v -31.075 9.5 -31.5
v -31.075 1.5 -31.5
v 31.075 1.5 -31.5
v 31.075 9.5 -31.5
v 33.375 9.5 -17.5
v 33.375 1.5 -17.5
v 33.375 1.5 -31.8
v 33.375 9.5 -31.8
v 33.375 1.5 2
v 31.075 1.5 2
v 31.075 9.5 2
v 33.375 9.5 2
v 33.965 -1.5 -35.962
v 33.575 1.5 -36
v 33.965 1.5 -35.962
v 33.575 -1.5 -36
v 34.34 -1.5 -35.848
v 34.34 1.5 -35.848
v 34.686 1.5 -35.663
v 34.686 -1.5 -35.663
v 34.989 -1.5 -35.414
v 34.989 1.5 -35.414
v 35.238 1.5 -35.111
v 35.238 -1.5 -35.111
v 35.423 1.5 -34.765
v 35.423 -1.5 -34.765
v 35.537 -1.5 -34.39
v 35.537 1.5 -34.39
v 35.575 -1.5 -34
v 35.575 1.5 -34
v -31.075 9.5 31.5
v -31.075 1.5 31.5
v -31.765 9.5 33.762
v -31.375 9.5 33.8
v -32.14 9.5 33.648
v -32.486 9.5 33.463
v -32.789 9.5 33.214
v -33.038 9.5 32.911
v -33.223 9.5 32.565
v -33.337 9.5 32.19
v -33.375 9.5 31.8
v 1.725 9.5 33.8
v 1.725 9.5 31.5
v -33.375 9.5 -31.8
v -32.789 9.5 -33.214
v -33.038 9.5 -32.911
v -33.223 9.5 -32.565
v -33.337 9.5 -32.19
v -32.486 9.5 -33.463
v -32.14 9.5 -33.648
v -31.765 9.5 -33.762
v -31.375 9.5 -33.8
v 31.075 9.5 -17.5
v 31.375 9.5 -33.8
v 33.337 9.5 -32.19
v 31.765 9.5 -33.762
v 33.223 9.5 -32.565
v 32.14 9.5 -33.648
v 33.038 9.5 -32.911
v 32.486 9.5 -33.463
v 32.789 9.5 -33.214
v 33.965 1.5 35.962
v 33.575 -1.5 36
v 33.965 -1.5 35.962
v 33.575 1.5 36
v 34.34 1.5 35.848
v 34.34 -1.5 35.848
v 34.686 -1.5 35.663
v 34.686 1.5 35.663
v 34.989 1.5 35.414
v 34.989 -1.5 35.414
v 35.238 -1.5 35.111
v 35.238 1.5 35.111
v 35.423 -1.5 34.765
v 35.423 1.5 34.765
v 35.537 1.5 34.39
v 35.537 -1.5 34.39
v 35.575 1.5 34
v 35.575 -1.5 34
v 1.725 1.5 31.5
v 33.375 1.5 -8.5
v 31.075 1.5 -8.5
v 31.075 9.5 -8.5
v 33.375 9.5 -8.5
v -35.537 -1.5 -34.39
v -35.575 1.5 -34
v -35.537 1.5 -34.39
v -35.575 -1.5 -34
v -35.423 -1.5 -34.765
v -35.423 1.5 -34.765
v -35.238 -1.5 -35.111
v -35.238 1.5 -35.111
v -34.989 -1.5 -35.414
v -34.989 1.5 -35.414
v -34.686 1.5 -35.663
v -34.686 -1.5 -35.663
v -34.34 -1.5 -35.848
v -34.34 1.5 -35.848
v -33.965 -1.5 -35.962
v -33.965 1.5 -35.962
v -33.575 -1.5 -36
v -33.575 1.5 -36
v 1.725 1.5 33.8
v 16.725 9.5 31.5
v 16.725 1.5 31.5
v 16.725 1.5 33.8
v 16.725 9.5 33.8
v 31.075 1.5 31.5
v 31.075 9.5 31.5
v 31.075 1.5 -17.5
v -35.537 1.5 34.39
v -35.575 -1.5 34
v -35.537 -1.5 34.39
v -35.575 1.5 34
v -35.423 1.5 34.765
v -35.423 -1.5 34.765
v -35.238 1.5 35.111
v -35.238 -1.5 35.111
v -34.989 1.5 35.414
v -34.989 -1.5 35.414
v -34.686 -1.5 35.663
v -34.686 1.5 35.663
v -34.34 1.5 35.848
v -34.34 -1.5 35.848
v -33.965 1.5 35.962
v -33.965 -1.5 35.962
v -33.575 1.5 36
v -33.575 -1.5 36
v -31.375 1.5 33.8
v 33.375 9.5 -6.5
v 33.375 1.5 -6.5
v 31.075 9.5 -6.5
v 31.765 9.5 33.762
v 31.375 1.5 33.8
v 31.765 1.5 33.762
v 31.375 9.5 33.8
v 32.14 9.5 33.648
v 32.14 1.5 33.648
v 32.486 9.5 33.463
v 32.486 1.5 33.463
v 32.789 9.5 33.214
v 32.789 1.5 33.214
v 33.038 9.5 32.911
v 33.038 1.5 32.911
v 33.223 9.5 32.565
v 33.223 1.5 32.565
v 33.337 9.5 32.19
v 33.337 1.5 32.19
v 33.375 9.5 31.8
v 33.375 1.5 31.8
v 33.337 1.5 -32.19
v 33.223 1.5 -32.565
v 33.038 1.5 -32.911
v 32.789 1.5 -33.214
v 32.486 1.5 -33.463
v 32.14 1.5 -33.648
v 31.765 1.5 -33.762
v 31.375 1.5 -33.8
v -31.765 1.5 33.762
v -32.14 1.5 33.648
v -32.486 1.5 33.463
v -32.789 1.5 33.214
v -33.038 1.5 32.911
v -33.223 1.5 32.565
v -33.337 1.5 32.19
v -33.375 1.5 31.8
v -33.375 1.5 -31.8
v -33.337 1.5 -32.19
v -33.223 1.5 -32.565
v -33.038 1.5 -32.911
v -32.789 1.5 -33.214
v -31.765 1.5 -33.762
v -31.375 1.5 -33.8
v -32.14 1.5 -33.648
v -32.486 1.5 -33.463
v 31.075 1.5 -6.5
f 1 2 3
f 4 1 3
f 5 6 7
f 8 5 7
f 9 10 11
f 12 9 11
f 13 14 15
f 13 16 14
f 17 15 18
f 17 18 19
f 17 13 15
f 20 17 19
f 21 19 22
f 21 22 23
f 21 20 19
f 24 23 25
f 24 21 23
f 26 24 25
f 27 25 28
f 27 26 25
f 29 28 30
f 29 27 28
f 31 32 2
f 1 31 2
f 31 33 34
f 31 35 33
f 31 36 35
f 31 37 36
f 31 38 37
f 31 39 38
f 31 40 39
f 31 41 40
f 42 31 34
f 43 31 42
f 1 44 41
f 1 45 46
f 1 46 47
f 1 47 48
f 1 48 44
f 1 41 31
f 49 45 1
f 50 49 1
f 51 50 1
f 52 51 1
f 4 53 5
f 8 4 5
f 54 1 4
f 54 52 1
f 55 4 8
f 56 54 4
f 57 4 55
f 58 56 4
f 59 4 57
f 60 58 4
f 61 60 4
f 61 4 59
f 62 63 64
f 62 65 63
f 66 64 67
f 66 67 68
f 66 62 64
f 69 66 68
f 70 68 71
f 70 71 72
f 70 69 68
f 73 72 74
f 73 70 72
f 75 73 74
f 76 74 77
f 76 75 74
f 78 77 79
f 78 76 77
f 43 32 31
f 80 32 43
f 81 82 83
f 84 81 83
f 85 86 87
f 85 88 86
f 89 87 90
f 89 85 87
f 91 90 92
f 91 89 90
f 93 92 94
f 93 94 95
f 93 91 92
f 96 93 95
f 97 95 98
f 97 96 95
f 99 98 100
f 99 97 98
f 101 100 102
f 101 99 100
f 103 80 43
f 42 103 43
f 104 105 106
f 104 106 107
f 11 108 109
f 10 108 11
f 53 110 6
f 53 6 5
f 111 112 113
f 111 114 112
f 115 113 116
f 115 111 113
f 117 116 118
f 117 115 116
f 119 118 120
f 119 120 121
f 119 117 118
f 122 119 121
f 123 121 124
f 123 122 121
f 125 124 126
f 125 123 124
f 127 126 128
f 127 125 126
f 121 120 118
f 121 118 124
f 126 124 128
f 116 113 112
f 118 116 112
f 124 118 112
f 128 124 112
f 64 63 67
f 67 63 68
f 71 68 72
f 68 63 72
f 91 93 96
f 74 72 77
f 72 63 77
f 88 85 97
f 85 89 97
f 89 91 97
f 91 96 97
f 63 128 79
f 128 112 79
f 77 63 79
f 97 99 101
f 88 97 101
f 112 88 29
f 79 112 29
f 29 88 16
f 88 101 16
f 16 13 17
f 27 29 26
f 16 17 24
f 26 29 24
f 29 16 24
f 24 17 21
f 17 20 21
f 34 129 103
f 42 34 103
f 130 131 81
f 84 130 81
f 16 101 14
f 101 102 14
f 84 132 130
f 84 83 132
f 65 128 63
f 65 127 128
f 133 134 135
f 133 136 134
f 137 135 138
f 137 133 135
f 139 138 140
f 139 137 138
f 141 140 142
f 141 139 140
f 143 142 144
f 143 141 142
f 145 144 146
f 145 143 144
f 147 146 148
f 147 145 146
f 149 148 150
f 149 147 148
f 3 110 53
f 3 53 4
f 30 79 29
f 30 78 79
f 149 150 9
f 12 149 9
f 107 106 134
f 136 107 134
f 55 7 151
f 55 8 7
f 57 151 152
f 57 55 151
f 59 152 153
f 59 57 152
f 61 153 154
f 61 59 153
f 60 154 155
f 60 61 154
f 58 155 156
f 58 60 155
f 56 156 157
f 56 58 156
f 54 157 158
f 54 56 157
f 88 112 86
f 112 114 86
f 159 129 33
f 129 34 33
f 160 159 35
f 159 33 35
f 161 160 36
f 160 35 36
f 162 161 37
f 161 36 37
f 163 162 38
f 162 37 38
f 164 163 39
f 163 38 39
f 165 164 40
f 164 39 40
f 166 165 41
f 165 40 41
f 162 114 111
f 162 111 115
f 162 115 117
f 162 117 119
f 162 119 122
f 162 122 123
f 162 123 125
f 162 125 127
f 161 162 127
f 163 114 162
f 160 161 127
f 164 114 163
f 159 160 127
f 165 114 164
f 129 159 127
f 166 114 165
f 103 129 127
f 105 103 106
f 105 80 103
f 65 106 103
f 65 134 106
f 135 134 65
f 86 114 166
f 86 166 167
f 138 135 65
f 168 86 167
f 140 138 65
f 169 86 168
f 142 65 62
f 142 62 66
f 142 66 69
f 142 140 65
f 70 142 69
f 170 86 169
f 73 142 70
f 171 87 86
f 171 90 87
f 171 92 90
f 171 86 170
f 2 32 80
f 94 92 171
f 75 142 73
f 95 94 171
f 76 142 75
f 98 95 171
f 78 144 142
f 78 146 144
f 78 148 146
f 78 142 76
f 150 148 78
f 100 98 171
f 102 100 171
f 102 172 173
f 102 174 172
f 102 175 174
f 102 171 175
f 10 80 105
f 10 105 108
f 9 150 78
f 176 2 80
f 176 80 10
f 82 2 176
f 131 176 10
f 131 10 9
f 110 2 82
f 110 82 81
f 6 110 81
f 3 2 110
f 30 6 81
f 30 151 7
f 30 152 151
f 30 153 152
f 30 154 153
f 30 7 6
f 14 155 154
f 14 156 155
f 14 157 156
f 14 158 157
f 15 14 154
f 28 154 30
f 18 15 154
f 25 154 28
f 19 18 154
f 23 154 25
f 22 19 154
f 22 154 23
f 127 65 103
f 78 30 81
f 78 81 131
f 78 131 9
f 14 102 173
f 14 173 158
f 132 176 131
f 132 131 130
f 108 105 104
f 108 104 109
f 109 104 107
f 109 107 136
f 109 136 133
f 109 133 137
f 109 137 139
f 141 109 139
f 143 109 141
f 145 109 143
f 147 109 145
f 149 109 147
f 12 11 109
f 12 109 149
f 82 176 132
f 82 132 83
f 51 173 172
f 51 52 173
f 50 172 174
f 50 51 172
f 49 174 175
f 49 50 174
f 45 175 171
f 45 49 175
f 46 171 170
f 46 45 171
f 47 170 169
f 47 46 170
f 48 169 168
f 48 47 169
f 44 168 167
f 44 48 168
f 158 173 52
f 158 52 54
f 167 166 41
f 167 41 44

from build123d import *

# Parameters (mm, degrees)
ESBO_O1_W                = 71.15
ESBO_O1_H                = 72
RESSALTO_EXTRUS_O1_DEPTH = 1.5
ESBO_O2_W                = 66.75
ESBO_O2_H                = 67.6
ESBO_O2_W_2              = 62.15
ESBO_O2_H_2              = 63
RESSALTO_EXTRUS_O2_DEPTH = 8
FILETE1_R                = 2
ESBO_O3_W                = 9
ESBO_O3_H                = 8
CORTE_EXTRUS_O1_DEPTH    = 4.5
ESBO_O4_W                = 8.5
ESBO_O4_H                = 8
CORTE_EXTRUS_O2_DEPTH    = 4.5
ESBO_O5_W                = 15
ESBO_O5_H                = 8
CORTE_EXTRUS_O3_DEPTH    = 4.5


with BuildPart() as part:
    # Esboço1 → Ressalto-extrusão1 (new body, symmetric)
    with BuildSketch(Plane(origin=(0, 0, 0), x_dir=(1, 0, 0), z_dir=(0, 1, 0))):
        Rectangle(ESBO_O1_W, ESBO_O1_H)
    extrude(amount=RESSALTO_EXTRUS_O1_DEPTH, both=True)

    # Esboço2 → Ressalto-extrusão2 (add)
    with BuildSketch(Plane(origin=(0, 1.5, 0), x_dir=(1, 0, 0), z_dir=(0, 1, 0))):
        Rectangle(ESBO_O2_W, ESBO_O2_H)
        Rectangle(ESBO_O2_W_2, ESBO_O2_H_2, mode=Mode.SUBTRACT)
    extrude(amount=RESSALTO_EXTRUS_O2_DEPTH)

    # Filete1
    filete1_edges = [part.edges().sort_by_distance(p)[0] for p in [
        (-33.375, 5.5, 33.8),
        (33.375, 5.5, 33.8),
        (33.375, 5.5, -33.8),
        (-33.375, 5.5, -33.8),
        (35.575, 0, 36),
        (-35.575, 0, 36),
        (-35.575, 0, -36),
        (35.575, 0, -36),
    ]]
    fillet(filete1_edges, radius=FILETE1_R)

    # Esboço3 → Corte-extrusão1 (cut)
    with BuildSketch(Plane.ZY.offset(-31.075)):
        with Locations((-13, 5.5)):
            Rectangle(ESBO_O3_W, ESBO_O3_H)
    extrude(amount=-CORTE_EXTRUS_O1_DEPTH, mode=Mode.SUBTRACT)

    # Esboço4 → Corte-extrusão2 (cut)
    with BuildSketch(Plane.ZY.offset(-31.075)):
        with Locations((-2.25, 5.5)):
            Rectangle(ESBO_O4_W, ESBO_O4_H)
    extrude(amount=-CORTE_EXTRUS_O2_DEPTH, mode=Mode.SUBTRACT)

    # Esboço5 → Corte-extrusão3 (cut)
    with BuildSketch(Plane(origin=(0, 0, 31.5), x_dir=(-1, 0, 0), z_dir=(0, 0, -1))):
        with Locations((-9.225, 5.5)):
            Rectangle(ESBO_O5_W, ESBO_O5_H)
    extrude(amount=-CORTE_EXTRUS_O3_DEPTH, mode=Mode.SUBTRACT)


solid = part.part
